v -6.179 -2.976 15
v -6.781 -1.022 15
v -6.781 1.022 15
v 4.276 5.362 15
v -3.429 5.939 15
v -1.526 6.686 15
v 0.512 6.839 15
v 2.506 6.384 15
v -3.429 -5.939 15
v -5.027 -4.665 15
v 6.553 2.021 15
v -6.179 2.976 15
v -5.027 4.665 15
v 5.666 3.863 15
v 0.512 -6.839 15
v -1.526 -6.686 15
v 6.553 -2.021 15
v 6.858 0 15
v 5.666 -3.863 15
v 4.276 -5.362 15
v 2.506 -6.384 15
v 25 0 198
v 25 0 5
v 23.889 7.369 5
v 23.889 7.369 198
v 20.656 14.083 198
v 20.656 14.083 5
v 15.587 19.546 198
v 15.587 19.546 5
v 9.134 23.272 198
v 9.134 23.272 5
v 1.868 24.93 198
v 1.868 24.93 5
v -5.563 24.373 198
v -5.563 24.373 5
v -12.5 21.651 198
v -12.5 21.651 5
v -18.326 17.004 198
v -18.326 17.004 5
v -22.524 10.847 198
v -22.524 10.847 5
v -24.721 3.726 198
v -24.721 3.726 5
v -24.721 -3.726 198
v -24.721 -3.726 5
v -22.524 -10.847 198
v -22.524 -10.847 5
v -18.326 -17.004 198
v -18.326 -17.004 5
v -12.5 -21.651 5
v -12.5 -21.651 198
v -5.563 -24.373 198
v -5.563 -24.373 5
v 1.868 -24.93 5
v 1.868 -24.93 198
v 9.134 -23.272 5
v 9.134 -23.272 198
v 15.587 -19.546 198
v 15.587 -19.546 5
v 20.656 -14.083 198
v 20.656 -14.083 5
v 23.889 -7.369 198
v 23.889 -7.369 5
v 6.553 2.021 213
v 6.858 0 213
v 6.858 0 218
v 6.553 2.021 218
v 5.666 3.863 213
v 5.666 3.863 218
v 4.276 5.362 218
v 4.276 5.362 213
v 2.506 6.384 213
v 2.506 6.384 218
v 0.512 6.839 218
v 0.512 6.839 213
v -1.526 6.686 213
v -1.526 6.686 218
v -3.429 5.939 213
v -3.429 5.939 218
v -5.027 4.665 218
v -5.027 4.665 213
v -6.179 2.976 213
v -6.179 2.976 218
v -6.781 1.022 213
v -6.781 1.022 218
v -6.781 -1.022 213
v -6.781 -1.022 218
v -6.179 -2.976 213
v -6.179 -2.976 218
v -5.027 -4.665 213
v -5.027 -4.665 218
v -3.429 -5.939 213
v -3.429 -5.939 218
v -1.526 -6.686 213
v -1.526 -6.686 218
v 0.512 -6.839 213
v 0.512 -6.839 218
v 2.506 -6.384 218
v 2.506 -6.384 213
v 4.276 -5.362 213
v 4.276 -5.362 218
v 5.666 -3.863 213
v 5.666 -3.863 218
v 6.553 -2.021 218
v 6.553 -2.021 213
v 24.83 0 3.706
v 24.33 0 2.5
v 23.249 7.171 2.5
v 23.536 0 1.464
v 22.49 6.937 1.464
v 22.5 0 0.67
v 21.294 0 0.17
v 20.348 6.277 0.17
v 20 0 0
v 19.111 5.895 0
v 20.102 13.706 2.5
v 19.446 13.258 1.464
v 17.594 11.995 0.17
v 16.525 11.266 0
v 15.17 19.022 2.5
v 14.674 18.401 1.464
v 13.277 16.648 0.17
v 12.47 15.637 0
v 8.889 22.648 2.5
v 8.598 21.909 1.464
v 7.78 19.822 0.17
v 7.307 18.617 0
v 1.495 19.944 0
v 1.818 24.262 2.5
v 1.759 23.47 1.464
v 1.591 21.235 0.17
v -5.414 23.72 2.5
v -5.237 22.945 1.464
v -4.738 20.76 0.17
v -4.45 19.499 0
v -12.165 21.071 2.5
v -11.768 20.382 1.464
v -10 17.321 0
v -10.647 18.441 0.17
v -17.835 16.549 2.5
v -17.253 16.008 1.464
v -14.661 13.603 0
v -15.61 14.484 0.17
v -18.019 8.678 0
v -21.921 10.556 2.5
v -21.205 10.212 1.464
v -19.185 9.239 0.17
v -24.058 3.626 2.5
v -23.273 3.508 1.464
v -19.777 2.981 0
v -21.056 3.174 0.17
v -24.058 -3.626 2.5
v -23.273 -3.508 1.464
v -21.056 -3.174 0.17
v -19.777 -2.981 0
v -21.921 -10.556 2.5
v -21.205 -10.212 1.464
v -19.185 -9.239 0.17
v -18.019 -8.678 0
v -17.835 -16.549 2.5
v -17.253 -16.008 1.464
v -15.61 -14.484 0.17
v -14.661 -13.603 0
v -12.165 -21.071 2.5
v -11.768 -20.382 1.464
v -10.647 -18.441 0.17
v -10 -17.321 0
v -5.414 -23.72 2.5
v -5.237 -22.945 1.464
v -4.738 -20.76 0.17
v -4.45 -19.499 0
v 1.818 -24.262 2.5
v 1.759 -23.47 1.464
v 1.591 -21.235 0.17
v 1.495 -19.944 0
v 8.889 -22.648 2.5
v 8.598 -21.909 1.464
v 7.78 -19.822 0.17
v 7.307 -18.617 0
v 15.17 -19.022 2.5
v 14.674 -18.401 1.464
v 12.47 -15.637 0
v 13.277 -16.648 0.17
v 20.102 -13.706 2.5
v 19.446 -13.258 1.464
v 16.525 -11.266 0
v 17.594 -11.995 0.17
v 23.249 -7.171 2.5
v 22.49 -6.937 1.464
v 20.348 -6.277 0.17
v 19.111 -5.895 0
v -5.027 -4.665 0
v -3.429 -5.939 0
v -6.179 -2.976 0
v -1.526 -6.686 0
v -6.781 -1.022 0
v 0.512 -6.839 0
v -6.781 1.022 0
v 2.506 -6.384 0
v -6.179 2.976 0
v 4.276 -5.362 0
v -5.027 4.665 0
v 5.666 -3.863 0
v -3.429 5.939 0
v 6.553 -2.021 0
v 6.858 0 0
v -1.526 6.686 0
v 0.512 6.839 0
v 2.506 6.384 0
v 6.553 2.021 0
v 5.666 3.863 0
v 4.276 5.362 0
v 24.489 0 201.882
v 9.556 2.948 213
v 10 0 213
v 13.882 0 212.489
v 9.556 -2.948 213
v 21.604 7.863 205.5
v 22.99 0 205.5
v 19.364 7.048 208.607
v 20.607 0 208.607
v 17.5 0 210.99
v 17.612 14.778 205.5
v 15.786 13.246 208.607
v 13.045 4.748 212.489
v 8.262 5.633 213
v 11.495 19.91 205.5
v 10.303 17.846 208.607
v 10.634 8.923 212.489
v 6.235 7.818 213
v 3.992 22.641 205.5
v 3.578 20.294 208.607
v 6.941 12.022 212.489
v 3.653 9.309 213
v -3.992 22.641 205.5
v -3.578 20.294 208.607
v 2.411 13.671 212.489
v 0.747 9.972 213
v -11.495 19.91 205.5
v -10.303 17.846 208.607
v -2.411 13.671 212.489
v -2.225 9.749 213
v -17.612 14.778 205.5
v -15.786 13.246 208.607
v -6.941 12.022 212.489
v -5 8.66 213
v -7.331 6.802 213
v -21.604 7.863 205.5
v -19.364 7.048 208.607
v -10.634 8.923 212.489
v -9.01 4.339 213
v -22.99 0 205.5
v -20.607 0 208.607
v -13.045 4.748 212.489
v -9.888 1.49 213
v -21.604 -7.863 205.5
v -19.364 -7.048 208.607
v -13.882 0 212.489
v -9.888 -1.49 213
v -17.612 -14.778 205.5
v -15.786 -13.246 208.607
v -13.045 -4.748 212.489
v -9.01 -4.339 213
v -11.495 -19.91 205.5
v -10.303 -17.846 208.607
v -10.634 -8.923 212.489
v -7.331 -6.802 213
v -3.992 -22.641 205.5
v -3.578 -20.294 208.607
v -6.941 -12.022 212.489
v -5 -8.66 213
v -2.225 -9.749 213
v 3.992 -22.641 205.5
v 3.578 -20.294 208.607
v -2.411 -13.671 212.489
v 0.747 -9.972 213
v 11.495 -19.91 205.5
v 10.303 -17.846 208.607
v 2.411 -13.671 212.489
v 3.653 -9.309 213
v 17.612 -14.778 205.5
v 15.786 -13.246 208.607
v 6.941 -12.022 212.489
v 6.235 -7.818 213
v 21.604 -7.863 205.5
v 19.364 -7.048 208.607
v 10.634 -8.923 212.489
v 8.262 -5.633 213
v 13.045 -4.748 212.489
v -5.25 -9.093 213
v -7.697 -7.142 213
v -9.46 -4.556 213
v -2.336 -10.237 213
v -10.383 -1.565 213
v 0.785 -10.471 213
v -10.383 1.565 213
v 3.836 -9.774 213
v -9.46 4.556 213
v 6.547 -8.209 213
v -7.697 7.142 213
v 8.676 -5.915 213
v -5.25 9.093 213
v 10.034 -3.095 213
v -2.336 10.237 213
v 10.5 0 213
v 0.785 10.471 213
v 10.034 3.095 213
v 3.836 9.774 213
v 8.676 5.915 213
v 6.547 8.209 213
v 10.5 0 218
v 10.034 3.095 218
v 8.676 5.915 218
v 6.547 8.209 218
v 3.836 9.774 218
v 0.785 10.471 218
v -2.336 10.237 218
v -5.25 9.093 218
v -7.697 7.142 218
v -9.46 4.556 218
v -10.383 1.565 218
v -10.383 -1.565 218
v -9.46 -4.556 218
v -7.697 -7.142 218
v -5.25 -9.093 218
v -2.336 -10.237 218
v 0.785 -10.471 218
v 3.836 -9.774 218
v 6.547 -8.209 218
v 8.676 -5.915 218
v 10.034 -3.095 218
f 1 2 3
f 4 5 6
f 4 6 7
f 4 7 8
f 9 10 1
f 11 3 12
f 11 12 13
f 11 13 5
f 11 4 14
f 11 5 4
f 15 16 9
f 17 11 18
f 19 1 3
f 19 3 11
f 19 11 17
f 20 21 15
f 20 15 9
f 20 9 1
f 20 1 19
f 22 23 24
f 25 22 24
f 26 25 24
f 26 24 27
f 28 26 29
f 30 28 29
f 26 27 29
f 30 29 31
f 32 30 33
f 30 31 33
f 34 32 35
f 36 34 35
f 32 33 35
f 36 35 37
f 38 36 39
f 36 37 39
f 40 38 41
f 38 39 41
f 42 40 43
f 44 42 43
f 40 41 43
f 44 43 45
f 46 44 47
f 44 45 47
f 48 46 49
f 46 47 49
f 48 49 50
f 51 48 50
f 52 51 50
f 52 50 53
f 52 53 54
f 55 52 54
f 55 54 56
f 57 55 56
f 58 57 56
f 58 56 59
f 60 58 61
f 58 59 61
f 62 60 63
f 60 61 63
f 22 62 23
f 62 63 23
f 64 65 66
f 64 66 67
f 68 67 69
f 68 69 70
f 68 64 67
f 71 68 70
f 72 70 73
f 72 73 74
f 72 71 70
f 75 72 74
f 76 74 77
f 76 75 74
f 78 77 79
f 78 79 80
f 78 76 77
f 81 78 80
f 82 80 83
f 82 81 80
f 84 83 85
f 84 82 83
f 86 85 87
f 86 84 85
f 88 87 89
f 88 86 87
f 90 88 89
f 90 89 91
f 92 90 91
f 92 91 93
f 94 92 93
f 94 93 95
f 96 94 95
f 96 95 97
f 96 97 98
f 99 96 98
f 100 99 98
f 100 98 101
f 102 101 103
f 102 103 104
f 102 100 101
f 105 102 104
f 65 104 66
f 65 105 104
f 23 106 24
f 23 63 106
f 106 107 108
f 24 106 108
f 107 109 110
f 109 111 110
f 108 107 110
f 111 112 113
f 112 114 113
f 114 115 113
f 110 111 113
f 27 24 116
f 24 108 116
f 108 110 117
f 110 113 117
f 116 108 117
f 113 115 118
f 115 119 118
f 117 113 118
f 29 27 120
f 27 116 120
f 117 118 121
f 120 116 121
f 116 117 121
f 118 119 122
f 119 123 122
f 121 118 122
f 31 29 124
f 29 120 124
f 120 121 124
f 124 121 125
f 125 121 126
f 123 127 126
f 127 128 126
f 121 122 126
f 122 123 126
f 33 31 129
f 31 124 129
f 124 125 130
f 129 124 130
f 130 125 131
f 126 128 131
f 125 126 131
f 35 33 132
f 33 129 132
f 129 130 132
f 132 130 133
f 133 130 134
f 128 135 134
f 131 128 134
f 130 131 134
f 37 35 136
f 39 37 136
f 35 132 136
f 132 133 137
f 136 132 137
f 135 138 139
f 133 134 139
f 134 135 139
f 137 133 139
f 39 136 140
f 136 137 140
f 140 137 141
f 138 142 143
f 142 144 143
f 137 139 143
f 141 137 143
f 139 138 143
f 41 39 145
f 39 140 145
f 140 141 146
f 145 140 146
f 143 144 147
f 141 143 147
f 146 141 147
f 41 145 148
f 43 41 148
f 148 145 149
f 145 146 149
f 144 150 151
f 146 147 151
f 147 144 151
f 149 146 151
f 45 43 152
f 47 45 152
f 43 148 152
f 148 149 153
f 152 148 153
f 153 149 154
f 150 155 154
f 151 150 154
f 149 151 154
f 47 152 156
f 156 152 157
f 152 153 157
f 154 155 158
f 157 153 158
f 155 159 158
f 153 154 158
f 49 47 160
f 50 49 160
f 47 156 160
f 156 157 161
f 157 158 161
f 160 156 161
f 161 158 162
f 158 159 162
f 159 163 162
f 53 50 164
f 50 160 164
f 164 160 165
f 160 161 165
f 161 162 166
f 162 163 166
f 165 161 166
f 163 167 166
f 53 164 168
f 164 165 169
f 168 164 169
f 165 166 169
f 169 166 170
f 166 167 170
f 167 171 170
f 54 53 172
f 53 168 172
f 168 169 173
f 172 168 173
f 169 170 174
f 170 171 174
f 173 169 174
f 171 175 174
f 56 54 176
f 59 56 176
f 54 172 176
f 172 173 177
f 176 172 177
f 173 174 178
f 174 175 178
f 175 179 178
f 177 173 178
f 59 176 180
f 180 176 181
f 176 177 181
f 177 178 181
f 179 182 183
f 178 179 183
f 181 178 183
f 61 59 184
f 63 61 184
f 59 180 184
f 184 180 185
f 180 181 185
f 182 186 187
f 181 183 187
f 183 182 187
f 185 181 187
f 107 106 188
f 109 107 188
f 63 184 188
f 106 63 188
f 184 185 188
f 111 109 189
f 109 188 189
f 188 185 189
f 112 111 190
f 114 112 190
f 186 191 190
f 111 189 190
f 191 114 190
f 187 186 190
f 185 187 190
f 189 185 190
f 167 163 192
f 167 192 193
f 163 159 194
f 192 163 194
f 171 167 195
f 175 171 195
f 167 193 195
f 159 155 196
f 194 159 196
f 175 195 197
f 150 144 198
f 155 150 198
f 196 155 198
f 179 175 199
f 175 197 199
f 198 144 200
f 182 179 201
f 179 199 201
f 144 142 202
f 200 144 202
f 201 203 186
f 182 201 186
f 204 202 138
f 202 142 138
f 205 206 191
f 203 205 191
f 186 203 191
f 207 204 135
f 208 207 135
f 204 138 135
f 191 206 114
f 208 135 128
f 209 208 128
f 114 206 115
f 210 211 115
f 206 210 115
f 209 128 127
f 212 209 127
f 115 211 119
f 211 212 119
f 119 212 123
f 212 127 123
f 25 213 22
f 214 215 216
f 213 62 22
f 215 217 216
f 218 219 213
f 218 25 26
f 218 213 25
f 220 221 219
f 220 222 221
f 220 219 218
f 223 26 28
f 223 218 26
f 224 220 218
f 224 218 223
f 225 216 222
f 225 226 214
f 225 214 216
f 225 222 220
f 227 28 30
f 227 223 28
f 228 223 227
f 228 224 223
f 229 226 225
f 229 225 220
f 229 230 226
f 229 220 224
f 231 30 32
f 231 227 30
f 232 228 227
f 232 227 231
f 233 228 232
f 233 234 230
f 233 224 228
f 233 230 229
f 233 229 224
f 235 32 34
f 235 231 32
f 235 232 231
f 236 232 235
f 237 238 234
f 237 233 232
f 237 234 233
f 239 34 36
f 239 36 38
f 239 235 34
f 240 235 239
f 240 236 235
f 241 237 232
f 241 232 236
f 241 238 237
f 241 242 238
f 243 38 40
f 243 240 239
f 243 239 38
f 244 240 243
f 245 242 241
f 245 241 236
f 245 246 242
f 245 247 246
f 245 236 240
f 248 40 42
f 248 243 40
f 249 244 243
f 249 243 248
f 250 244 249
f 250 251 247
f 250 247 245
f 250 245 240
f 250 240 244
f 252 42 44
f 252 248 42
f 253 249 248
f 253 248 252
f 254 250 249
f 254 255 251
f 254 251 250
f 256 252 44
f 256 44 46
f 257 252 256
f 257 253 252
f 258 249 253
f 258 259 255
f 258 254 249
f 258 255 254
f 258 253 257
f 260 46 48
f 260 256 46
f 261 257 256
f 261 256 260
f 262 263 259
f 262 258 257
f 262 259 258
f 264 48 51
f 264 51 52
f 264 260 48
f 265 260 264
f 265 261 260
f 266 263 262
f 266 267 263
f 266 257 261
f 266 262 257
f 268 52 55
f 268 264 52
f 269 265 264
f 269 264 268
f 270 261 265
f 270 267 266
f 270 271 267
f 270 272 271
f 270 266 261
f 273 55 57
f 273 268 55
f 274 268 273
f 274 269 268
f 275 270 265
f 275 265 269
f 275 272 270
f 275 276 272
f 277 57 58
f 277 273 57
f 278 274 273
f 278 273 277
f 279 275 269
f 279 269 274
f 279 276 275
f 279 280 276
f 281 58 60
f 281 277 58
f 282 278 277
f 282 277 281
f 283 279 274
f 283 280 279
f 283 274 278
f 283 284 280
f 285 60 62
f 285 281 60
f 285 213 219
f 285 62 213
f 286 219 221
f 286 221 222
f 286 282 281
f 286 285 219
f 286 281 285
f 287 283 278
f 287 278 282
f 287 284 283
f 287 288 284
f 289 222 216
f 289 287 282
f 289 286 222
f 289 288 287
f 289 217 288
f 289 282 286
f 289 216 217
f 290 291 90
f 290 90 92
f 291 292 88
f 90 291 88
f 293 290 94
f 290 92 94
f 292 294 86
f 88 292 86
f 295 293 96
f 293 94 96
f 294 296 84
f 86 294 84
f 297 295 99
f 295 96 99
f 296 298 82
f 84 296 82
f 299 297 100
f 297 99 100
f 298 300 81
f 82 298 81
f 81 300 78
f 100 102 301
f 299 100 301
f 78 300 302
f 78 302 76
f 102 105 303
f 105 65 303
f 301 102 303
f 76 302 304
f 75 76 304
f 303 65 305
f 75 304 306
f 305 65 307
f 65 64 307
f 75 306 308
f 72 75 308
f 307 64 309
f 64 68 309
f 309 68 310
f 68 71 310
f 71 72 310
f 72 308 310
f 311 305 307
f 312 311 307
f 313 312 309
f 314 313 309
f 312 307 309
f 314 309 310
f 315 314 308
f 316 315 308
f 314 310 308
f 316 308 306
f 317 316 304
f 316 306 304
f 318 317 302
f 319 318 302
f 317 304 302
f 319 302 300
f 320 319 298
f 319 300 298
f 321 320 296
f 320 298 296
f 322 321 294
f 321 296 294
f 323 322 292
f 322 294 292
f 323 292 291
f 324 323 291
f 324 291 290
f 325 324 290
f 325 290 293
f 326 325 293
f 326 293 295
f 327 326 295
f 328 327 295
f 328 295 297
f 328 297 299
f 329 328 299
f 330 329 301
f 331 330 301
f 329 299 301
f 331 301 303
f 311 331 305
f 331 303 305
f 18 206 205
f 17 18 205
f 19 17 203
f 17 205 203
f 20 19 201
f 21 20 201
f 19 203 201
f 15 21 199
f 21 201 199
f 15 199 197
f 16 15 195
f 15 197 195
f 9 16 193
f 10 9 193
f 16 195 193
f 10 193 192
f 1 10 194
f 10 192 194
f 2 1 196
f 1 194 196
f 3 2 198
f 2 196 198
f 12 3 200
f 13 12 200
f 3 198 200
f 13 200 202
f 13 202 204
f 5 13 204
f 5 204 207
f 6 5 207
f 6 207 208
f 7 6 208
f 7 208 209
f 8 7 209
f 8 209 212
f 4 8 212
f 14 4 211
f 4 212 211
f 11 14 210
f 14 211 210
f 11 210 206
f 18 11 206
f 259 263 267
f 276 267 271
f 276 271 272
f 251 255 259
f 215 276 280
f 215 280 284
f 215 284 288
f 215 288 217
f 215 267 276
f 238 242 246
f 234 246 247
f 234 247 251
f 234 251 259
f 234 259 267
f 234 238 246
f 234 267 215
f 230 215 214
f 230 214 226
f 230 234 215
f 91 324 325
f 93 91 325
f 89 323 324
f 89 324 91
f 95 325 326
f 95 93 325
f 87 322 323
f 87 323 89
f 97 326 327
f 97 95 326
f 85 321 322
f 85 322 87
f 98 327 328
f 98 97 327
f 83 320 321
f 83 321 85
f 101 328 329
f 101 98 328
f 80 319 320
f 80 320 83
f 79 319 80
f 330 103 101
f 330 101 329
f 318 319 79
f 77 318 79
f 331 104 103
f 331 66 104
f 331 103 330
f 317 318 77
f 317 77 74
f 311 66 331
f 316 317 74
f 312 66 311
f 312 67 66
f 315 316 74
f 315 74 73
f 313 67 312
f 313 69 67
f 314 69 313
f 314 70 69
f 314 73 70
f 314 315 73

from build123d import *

# Parameters (mm, degrees)
F0_R     = 25
F1_DEPTH = 213
F2_R     = 15
F3_R     = 5
F4_R     = 10.5
F4_R_2   = 6.858
F5_DEPTH = 5
F6_R     = 6.858
F7_DEPTH = 15


with BuildPart() as f1:
    # F0 (on Top) → F1 (new body)
    with BuildSketch(Plane.XY):
        Circle(F0_R)
    extrude(amount=F1_DEPTH)

    # F2
    f2_edges = [f1.edges().sort_by_distance(p)[0] for p in [
        (-25, 0, 213),
    ]]
    fillet(f2_edges, radius=F2_R)

    # F3
    f3_edges = [f1.edges().sort_by_distance(p)[0] for p in [
        (-25, 0, 0),
    ]]
    fillet(f3_edges, radius=F3_R)

    # F6 (on face) → F7 (cut)
    with BuildSketch(Plane(origin=(0, 0, 0), x_dir=(1, 0, 0), z_dir=(0, 0, -1))):
        Circle(F6_R)
    extrude(amount=-F7_DEPTH, mode=Mode.SUBTRACT)


with BuildPart() as f5:
    # F4 (on face) → F5 (new body)
    with BuildSketch(Plane.XY.offset(213)):
        Circle(F4_R)
        Circle(F4_R_2, mode=Mode.SUBTRACT)
    extrude(amount=F5_DEPTH)


solid = Compound([f1.part, f5.part])
